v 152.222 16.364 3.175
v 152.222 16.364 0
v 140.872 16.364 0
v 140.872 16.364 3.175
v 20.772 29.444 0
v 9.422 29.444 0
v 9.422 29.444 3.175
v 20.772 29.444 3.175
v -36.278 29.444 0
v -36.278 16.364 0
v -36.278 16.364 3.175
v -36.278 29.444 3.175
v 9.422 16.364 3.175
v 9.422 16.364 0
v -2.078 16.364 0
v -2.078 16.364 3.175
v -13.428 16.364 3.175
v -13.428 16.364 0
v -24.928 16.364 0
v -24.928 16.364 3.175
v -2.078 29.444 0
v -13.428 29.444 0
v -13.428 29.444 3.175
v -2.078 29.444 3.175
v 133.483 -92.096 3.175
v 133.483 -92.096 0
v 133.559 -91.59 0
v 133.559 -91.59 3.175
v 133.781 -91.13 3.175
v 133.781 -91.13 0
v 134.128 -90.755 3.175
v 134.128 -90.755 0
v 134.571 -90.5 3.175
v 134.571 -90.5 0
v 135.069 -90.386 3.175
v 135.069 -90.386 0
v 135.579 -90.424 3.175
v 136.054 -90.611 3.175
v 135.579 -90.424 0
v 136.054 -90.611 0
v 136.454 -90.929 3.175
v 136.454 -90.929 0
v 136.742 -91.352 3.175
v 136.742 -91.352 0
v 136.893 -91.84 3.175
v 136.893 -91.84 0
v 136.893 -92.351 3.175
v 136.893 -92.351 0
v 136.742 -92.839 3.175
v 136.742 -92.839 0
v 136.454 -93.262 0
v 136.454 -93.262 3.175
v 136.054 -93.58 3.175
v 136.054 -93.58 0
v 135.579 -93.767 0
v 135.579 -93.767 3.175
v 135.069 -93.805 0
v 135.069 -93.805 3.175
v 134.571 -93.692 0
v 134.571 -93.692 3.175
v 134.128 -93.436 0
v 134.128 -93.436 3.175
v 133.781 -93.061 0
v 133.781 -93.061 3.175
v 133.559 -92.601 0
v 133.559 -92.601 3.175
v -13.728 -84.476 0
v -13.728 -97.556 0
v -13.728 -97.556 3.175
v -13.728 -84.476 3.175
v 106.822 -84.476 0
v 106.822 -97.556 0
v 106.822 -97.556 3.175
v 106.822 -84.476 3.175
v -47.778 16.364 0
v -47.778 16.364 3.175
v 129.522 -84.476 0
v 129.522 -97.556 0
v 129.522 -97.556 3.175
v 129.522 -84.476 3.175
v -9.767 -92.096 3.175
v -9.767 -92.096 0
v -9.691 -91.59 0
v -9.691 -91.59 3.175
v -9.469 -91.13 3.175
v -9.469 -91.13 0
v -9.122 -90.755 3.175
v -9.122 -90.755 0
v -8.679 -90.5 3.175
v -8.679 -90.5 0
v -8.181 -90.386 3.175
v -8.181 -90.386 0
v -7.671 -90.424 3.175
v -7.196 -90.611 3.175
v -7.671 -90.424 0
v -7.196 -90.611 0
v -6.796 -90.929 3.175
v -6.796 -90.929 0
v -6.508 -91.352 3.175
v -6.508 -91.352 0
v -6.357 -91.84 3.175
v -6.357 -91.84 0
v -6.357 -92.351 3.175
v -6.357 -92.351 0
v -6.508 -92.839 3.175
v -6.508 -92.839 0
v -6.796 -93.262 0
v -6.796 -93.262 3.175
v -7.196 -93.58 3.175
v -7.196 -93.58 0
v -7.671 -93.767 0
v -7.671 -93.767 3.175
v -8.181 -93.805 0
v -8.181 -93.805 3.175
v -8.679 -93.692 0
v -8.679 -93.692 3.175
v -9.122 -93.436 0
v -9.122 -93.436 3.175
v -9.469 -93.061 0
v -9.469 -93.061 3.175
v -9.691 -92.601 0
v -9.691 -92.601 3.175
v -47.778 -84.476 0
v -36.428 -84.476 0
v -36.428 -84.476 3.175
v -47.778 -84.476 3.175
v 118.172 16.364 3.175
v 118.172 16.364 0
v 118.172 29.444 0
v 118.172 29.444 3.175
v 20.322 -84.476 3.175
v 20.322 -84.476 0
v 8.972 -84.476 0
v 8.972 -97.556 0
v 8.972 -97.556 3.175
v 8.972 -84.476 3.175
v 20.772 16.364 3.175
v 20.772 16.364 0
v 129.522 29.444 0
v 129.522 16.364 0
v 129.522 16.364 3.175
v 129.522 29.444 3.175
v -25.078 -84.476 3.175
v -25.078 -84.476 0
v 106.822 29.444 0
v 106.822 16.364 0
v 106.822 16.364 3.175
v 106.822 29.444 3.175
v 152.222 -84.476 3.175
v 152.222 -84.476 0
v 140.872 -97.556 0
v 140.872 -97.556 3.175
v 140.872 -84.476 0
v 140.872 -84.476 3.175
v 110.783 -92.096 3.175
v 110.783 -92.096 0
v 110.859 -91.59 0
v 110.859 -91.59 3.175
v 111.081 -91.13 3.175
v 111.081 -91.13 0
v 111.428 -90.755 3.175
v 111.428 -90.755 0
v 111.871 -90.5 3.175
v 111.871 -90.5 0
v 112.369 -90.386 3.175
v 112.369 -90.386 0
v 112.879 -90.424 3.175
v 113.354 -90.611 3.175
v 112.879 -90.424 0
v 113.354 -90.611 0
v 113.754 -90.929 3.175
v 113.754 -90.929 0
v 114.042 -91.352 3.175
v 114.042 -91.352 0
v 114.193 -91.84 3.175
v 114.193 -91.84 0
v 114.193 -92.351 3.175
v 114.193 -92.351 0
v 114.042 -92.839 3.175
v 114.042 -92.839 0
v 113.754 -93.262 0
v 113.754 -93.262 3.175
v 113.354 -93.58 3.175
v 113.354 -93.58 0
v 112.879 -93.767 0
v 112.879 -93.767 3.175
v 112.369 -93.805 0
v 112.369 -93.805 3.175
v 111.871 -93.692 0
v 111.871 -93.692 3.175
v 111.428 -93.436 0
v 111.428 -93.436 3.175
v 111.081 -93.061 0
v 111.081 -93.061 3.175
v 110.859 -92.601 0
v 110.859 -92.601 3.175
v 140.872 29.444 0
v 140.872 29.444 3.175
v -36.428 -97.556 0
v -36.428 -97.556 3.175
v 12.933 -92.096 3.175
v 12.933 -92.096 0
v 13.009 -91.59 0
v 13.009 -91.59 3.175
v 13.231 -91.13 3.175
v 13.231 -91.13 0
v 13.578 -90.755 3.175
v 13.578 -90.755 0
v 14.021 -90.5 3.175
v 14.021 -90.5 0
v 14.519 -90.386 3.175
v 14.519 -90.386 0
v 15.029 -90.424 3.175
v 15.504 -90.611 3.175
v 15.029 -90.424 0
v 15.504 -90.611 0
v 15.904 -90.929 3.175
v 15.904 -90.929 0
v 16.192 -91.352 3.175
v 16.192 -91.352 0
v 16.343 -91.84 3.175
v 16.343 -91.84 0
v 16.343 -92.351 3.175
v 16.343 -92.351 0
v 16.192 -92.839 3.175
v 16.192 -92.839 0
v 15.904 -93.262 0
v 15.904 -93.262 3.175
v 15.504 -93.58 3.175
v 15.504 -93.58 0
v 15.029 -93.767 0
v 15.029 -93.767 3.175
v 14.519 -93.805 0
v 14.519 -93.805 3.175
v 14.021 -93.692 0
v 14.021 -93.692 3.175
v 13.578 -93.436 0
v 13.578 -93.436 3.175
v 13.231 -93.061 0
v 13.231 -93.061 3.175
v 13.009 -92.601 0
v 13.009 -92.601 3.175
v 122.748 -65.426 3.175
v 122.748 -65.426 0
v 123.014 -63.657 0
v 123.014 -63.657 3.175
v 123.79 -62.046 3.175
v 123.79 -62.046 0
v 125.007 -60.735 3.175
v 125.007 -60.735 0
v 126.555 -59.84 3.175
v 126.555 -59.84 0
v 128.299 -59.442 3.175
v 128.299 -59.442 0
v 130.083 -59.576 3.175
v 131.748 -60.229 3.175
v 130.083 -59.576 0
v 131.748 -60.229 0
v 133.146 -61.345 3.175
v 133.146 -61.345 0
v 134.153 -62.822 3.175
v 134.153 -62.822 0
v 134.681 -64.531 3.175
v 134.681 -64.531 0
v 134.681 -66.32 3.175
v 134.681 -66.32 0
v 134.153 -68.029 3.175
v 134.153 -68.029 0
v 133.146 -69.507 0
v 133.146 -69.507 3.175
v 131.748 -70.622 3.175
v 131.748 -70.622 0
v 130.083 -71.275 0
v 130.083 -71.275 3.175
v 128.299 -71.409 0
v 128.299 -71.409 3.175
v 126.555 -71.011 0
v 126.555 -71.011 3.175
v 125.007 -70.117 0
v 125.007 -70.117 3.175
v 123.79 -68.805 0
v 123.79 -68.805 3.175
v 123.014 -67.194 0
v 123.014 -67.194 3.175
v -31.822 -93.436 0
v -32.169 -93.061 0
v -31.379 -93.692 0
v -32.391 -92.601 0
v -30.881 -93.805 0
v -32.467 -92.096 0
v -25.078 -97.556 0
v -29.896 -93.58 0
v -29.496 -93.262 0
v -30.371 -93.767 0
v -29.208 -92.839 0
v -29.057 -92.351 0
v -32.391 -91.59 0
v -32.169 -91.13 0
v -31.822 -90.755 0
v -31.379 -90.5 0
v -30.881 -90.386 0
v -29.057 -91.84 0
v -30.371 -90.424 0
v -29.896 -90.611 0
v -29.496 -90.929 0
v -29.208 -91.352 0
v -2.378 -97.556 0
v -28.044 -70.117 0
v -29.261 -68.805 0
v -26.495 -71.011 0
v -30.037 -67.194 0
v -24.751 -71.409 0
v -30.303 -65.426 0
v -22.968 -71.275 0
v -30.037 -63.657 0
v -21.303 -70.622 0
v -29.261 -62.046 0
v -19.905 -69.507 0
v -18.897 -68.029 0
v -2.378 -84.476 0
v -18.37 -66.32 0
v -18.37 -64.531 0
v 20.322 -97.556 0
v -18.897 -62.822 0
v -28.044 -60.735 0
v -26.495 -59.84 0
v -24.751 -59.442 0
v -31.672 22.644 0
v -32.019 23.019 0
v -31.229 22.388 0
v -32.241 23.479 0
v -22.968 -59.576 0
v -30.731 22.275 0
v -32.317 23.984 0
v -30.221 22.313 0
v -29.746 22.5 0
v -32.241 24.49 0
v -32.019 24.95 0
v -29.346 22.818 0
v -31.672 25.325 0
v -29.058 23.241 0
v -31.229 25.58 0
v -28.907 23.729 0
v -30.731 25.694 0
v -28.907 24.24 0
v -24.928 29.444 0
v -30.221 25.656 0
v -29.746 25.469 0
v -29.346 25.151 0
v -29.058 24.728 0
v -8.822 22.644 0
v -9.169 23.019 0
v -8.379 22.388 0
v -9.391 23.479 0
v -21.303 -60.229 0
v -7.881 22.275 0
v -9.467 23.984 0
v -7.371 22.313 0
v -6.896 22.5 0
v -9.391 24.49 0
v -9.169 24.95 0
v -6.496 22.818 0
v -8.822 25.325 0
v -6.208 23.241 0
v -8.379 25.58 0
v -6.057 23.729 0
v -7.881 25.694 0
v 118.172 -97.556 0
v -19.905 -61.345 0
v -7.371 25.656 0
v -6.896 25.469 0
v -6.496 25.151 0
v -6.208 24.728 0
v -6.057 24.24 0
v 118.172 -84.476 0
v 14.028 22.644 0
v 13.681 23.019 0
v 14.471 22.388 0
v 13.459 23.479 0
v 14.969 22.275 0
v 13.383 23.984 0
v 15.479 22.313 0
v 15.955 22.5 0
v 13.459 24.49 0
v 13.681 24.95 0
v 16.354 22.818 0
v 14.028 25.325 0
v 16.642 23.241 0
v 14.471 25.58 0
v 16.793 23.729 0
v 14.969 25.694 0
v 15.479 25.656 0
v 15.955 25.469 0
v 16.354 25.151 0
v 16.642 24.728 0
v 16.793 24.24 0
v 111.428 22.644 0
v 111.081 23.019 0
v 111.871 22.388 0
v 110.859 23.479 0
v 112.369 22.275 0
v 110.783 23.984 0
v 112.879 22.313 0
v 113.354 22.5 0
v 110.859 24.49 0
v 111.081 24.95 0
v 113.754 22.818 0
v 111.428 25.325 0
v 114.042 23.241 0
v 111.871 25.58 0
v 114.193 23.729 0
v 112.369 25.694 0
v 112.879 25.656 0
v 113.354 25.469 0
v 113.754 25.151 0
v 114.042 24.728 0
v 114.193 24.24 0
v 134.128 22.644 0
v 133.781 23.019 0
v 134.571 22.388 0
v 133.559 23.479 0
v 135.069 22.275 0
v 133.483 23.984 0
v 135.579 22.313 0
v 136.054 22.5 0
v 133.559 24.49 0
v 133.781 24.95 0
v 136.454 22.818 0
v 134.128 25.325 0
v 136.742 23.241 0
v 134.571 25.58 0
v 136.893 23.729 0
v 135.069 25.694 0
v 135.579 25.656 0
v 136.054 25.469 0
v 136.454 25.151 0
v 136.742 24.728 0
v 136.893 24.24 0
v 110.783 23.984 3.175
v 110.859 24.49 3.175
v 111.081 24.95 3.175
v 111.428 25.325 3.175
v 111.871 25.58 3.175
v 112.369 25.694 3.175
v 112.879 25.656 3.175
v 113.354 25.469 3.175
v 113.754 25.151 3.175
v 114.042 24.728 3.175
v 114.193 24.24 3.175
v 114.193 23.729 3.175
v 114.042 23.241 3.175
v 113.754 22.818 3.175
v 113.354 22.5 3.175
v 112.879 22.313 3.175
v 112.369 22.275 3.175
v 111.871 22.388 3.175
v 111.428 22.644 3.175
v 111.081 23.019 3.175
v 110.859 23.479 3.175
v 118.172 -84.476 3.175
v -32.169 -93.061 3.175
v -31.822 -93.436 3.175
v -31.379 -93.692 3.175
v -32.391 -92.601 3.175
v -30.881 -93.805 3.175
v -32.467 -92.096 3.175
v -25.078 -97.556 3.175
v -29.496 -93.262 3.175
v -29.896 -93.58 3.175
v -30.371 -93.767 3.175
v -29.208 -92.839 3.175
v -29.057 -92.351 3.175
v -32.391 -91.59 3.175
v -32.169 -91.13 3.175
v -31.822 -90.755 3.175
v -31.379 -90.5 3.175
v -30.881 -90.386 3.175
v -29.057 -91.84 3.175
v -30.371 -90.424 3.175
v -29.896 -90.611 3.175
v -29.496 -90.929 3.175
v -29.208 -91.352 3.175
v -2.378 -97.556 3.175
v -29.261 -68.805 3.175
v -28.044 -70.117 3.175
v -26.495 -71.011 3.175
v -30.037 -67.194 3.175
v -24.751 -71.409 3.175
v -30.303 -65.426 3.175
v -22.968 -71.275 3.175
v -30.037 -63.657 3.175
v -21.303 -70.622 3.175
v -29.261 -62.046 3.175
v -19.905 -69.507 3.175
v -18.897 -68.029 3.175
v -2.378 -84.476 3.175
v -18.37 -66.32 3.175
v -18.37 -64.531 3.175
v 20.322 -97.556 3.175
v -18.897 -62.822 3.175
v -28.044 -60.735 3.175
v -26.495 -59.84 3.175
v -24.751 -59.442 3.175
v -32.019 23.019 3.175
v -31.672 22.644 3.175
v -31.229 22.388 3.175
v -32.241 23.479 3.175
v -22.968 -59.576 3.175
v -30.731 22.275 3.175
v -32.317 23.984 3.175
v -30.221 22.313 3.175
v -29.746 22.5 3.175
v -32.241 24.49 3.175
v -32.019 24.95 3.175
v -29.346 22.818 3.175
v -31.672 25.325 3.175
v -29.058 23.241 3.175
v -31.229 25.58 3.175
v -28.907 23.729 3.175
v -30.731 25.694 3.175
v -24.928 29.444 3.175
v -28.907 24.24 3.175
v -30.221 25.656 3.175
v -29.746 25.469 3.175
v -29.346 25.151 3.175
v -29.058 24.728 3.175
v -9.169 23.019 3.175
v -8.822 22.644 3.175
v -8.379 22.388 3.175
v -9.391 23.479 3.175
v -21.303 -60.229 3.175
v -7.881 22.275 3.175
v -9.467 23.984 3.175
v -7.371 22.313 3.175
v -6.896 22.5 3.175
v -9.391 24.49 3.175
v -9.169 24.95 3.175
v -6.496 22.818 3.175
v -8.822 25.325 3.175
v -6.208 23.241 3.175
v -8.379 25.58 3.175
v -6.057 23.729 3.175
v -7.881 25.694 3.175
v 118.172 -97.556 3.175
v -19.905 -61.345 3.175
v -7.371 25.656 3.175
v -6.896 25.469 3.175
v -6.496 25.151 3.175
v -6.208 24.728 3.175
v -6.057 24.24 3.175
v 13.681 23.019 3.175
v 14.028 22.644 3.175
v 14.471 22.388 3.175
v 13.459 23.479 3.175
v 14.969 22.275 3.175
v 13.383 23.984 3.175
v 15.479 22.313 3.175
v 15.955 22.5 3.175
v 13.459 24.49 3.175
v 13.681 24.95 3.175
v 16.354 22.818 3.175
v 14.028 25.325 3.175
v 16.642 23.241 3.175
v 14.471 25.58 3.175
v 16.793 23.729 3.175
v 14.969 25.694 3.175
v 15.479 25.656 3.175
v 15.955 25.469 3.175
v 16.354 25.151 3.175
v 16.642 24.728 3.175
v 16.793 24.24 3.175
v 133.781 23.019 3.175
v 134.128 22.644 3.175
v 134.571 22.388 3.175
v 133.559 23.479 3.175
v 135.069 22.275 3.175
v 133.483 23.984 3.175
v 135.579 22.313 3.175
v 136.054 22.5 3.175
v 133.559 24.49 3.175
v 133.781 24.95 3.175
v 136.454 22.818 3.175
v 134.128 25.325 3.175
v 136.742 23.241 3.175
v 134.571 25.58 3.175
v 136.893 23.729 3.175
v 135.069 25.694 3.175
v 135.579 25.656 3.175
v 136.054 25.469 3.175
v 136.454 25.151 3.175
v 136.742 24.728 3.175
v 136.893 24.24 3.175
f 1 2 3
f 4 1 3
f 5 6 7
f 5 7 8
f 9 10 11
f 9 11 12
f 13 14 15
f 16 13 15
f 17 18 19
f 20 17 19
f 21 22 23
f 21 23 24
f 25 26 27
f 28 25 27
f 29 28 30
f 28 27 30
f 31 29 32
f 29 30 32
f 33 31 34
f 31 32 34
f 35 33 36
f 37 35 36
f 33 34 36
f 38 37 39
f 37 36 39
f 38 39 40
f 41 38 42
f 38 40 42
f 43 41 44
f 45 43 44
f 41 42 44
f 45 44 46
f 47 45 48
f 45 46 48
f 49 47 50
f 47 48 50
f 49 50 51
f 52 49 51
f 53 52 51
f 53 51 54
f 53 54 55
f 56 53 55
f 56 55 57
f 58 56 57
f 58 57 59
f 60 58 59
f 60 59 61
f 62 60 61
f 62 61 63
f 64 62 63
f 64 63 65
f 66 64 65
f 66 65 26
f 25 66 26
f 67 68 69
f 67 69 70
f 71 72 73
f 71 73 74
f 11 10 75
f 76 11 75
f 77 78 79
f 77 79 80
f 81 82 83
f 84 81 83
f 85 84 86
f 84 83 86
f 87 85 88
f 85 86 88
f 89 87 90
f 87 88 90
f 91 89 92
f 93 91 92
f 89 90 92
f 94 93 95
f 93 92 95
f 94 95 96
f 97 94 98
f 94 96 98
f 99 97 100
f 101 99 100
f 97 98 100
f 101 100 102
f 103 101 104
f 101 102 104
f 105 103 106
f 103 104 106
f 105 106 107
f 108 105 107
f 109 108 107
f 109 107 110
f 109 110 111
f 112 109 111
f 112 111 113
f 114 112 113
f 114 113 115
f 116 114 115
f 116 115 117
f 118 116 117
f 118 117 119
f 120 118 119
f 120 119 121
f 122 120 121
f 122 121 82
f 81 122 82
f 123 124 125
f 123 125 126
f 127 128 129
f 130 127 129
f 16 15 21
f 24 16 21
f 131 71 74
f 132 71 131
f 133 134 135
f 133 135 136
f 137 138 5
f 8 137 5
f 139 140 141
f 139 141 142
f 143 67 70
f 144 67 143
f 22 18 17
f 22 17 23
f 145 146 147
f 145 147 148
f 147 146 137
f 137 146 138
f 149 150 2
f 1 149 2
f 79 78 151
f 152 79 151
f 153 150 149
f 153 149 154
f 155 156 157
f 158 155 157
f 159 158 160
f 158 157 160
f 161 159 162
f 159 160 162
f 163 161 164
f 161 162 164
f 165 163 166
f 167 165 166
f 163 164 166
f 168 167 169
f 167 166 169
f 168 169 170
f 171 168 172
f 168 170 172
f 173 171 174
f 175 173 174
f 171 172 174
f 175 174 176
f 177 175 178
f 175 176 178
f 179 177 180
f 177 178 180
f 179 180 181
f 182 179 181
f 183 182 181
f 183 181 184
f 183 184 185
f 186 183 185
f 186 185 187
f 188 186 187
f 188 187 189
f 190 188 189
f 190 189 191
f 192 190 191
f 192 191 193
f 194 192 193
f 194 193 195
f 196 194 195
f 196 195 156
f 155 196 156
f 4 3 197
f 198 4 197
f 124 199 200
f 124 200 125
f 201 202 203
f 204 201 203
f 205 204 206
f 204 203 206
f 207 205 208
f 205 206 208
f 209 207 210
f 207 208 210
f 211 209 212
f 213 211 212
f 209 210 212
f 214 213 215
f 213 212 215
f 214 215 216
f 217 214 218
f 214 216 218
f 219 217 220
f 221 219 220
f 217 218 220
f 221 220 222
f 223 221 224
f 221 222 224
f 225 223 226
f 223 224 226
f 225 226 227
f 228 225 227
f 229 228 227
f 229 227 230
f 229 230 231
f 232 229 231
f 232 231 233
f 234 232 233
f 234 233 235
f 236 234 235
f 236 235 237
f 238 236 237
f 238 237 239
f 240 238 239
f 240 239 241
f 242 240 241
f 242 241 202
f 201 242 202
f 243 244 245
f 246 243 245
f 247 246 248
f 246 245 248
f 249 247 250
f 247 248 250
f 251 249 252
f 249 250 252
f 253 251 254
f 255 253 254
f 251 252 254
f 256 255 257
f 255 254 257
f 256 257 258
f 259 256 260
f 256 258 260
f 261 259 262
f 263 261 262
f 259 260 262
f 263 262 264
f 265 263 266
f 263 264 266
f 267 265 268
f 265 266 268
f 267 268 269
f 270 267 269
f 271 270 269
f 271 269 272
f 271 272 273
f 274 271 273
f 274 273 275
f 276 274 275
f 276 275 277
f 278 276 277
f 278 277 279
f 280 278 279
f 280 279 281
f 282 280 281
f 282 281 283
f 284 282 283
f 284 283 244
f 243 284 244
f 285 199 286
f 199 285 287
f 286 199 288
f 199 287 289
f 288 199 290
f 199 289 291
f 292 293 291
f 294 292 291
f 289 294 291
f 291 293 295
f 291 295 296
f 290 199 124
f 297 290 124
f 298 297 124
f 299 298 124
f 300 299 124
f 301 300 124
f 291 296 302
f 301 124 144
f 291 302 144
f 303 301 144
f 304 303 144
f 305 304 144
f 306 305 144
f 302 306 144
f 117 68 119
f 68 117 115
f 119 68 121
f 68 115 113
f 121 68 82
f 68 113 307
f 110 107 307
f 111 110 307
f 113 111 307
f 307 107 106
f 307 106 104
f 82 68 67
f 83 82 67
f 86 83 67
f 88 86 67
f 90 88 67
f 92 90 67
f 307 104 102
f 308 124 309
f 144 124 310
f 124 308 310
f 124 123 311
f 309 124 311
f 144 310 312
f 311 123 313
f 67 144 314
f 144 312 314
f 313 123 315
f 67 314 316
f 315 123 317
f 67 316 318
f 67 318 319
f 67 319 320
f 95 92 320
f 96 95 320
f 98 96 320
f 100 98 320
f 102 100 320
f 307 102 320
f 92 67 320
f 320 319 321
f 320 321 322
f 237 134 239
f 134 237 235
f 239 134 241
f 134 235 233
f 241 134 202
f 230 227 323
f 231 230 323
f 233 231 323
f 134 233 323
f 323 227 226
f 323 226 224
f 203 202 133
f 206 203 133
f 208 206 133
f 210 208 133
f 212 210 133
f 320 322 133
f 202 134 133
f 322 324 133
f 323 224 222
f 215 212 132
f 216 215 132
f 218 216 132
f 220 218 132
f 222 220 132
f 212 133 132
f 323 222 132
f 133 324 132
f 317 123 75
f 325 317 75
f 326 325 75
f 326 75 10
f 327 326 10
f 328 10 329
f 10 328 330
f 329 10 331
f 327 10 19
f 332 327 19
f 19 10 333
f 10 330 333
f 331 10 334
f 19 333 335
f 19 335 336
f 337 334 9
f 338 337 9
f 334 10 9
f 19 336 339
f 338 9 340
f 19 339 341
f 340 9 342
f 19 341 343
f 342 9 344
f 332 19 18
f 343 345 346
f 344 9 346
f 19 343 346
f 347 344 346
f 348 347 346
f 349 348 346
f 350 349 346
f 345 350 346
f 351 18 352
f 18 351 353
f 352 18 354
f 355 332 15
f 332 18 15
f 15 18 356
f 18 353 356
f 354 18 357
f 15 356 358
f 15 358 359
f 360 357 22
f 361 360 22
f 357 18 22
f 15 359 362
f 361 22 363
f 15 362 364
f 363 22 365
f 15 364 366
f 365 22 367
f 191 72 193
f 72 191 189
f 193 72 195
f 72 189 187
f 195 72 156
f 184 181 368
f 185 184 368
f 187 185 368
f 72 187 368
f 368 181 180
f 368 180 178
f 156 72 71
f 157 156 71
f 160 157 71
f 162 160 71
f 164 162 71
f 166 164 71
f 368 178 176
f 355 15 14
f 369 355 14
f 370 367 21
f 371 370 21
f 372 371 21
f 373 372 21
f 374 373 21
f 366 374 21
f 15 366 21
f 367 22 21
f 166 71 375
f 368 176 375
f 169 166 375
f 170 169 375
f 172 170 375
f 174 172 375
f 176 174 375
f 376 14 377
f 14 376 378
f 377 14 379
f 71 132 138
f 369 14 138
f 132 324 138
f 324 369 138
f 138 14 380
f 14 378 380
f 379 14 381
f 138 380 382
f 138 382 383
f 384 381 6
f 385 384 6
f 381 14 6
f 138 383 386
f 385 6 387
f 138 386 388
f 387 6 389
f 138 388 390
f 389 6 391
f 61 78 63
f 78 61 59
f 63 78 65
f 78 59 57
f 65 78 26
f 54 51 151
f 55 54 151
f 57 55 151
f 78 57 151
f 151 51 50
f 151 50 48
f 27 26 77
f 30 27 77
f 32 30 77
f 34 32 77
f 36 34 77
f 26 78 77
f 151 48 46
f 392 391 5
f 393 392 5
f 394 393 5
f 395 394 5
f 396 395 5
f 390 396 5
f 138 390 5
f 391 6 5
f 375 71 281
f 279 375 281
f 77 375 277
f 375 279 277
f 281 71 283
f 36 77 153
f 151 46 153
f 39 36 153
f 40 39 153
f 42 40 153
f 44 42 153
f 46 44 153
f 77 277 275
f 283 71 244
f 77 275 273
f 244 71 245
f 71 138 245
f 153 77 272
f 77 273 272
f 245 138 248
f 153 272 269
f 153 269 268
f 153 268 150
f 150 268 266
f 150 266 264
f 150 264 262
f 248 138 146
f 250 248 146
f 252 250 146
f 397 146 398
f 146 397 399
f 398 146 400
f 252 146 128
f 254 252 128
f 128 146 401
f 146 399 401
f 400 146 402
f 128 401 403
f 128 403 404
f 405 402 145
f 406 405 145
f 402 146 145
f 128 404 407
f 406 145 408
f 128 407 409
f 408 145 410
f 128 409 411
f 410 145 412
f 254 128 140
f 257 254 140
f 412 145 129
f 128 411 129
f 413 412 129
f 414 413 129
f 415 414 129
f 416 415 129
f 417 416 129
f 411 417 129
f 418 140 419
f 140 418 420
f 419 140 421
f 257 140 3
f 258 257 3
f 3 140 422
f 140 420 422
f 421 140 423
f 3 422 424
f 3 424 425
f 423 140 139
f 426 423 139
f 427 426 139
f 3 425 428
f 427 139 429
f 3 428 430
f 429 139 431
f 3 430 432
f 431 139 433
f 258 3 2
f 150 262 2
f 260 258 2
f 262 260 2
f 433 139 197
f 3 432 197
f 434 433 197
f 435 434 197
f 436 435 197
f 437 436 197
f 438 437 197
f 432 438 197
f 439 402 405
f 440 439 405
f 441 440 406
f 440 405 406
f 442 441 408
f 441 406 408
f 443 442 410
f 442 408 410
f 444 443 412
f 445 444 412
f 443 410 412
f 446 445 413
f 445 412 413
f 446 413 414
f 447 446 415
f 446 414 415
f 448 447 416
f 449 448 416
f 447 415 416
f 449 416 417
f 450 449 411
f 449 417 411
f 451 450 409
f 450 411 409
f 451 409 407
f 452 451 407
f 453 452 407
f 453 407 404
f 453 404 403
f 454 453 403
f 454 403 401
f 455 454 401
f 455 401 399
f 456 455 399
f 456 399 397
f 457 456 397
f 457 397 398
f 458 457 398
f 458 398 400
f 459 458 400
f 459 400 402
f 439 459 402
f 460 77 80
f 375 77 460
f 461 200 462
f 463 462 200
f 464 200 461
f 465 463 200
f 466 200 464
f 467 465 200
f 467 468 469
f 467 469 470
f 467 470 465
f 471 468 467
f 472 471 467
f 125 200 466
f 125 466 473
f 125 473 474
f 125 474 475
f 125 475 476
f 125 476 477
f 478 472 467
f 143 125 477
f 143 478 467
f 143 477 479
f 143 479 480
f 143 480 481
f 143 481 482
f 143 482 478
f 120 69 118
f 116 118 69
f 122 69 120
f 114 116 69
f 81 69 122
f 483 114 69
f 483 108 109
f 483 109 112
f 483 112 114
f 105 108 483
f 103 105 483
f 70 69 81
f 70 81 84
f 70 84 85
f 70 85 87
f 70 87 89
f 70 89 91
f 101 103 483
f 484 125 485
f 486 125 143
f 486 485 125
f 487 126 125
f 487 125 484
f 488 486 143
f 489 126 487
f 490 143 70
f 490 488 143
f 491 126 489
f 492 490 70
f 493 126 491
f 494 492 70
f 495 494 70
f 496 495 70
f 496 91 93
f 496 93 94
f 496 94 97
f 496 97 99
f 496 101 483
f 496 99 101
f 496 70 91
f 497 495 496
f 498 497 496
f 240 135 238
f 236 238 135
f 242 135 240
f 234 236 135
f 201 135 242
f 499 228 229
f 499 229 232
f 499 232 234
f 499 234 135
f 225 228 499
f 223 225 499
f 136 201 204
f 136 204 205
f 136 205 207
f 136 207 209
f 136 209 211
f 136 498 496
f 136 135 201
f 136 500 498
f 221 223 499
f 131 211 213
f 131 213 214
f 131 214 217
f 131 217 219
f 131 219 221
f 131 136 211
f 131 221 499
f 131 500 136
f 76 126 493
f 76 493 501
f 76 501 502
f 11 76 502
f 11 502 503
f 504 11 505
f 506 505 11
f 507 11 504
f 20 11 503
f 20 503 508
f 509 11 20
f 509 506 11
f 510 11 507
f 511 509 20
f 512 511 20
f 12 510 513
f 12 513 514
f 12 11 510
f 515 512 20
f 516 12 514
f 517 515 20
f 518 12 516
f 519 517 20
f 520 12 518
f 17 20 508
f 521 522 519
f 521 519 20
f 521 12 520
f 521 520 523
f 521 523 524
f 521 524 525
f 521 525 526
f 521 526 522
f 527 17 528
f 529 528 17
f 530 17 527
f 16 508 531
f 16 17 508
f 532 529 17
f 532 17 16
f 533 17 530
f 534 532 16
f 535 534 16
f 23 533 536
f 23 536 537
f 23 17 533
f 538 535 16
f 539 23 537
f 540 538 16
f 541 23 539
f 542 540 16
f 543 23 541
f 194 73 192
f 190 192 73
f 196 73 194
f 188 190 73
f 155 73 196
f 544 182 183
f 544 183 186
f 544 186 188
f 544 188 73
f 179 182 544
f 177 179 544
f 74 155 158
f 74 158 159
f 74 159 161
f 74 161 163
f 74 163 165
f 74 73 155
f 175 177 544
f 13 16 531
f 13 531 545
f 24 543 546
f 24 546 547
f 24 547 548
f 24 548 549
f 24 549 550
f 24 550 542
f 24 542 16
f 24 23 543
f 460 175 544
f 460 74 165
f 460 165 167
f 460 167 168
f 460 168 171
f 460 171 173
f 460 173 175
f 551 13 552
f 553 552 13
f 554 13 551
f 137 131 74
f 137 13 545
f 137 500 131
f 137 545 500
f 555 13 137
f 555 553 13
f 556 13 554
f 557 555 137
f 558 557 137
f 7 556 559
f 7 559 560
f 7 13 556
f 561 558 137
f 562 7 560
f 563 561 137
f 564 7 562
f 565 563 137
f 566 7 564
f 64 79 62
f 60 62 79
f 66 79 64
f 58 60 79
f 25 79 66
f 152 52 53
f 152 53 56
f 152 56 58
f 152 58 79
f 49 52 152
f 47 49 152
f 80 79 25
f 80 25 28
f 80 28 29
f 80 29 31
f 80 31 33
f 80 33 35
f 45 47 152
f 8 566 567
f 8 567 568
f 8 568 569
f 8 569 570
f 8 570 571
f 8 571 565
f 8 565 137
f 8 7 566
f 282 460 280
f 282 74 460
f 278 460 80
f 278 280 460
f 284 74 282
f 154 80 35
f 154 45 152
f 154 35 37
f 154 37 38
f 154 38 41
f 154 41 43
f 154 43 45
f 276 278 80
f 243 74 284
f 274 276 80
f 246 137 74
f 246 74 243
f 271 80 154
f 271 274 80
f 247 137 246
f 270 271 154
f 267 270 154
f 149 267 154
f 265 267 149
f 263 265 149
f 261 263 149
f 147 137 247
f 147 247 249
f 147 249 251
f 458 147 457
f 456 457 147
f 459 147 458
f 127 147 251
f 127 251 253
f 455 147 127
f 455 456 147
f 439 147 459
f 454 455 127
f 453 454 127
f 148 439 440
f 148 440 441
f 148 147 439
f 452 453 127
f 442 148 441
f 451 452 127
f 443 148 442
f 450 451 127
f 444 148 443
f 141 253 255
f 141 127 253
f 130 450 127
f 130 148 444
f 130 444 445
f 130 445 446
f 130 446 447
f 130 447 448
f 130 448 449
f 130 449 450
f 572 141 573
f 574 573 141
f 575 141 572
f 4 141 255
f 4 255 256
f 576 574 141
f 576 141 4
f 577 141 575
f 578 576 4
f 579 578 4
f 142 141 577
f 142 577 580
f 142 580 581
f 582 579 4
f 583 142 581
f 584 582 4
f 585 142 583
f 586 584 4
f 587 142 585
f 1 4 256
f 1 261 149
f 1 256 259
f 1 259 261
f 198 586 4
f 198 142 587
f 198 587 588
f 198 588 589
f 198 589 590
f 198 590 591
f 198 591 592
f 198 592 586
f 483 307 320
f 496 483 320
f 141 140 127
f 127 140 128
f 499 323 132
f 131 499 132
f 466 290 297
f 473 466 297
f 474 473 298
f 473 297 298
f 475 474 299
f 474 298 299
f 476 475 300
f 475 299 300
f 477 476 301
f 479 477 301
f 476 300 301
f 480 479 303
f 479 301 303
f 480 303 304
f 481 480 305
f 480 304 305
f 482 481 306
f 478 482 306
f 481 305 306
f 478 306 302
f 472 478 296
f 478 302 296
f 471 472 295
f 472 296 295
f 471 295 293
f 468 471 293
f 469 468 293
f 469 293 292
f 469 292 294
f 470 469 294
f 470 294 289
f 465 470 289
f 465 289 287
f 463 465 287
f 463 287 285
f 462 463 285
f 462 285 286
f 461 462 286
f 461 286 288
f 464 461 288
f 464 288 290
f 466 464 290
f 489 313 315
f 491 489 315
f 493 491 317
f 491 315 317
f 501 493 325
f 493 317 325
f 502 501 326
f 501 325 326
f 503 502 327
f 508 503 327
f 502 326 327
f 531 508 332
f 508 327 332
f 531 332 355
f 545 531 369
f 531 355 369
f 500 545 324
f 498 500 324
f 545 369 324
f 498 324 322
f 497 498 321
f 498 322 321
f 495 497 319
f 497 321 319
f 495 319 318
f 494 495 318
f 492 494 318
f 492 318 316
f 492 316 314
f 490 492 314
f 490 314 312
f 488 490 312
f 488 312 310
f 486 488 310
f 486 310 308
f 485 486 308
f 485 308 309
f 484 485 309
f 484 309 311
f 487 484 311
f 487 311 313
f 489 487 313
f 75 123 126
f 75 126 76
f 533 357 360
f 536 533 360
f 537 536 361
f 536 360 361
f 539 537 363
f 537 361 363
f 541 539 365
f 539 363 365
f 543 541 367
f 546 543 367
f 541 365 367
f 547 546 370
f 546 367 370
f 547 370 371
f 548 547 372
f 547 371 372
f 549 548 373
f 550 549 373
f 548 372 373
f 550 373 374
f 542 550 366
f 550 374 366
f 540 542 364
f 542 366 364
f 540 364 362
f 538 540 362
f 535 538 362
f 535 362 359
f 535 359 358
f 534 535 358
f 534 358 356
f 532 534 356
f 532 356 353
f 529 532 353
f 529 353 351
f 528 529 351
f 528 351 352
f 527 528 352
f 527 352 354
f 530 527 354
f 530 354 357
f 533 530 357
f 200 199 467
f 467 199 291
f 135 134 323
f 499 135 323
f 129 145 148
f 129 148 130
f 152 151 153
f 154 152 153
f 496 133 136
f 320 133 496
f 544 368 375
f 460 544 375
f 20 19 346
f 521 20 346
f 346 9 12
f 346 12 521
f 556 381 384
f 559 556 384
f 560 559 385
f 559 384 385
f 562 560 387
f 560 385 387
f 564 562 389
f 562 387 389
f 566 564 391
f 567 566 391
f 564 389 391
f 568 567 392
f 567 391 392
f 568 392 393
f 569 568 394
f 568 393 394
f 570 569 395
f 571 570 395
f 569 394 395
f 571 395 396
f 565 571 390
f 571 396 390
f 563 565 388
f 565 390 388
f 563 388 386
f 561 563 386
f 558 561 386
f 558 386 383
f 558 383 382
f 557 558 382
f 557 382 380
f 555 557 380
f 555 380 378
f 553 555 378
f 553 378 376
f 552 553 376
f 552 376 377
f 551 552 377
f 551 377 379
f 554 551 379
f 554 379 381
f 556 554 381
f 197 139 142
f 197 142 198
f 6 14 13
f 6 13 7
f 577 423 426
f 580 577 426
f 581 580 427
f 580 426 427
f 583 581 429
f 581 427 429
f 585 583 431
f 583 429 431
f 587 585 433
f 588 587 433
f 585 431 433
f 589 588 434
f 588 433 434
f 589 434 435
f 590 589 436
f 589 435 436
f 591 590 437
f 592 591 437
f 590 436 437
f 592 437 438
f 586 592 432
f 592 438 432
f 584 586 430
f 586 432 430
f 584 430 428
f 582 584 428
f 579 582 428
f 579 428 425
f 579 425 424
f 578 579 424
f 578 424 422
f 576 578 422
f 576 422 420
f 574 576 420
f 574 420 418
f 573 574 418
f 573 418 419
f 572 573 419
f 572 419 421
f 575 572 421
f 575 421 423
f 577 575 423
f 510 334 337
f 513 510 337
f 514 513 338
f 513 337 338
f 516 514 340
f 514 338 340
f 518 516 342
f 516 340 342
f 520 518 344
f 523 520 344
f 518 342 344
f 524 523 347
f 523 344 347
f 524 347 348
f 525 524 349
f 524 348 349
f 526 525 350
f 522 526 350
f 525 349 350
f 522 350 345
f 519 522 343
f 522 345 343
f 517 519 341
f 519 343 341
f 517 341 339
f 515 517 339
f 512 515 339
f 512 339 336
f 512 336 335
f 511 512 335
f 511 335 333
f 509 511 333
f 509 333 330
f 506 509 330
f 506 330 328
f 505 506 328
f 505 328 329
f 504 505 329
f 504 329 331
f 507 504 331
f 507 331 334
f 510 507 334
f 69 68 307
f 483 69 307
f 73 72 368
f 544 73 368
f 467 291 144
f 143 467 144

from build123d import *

# Parameters (mm, degrees)
SKETCH1_W               = 200
SKETCH1_H               = 127
BOSS_EXTRUDE1_DEPTH     = 3.175
SKETCH4_W               = 11.35
SKETCH4_H               = 13.0800094
SKETCH4_W_2             = 86.049970282
SKETCH4_W_3             = 11.50001
SKETCH4_W_4             = 86.500000282
CUT_EXTRUDE1_DEPTH      = 4.175
SKETCH5_R               = 6
CUT_EXTRUDE2_DEPTH      = 1
CUT_EXTRUDE2_DEPTH_BACK = 4.175
SKETCH6_R               = 1.7145
CUT_EXTRUDE3_DEPTH      = 4.175


with BuildPart() as part:
    # Sketch1 → Boss-Extrude1 (new body)
    with BuildSketch(Plane.XY):
        with Locations((52.222222222, -34.055555556)):
            Rectangle(SKETCH1_W, SKETCH1_H)
    extrude(amount=BOSS_EXTRUDE1_DEPTH)

    # Sketch4 → Cut-Extrude1 (cut, through all)
    with BuildSketch(Plane(origin=(0, 0, 0), x_dir=(-1, 0, 0), z_dir=(0, 0, -1))):
        with Locations((-146.547222222, 22.904439744)):
            Rectangle(SKETCH4_W, SKETCH4_H)
        with Locations((-123.847222222, 22.904439744)):
            Rectangle(SKETCH4_W, SKETCH4_H)
        with Locations((-63.797237175, 22.904439744)):
            Rectangle(SKETCH4_W_2, SKETCH4_H)
        with Locations((-3.672247128, 22.904439744)):
            Rectangle(SKETCH4_W_3, SKETCH4_H)
        with Locations((19.177762872, 22.904439744)):
            Rectangle(SKETCH4_W_3, SKETCH4_H)
        with Locations((42.027772778, 22.904439744)):
            Rectangle(SKETCH4_W_3, SKETCH4_H)
        with Locations((-146.547222222, -91.015550856)):
            Rectangle(SKETCH4_W, SKETCH4_H)
        with Locations((-123.847222222, -91.015550856)):
            Rectangle(SKETCH4_W, SKETCH4_H)
        with Locations((-63.572222175, -91.015550856)):
            Rectangle(SKETCH4_W_4, SKETCH4_H)
        with Locations((-3.297222034, -91.015550856)):
            Rectangle(SKETCH4_W, SKETCH4_H)
        with Locations((19.402777872, -91.015550856)):
            Rectangle(SKETCH4_W, SKETCH4_H)
        with Locations((42.102777778, -91.015550856)):
            Rectangle(SKETCH4_W, SKETCH4_H)
    extrude(amount=-CUT_EXTRUDE1_DEPTH, mode=Mode.SUBTRACT)

    # Sketch5 → Cut-Extrude2 (cut, two sides)
    with BuildSketch(Plane(origin=(0, 0, 0), x_dir=(-1, 0, 0), z_dir=(0, 0, -1))) as cut_extrude2_sk:
        with Locations((-128.747542222, -65.425546156)):
            Circle(SKETCH5_R)
        with Locations((24.303097778, -65.425546156)):
            Circle(SKETCH5_R)
    extrude(amount=CUT_EXTRUDE2_DEPTH, mode=Mode.SUBTRACT)
    extrude(cut_extrude2_sk.sketch, amount=-CUT_EXTRUDE2_DEPTH_BACK, mode=Mode.SUBTRACT)

    # Sketch6 → Cut-Extrude3 (cut, through all)
    with BuildSketch(Plane(origin=(0, 0, 0), x_dir=(-1, 0, 0), z_dir=(0, 0, -1))):
        with Locations((-135.197222222, 23.984435044)):
            Circle(SKETCH6_R)
        with Locations((-112.497222269, 23.984435044)):
            Circle(SKETCH6_R)
        with Locations((-15.097252081, 23.984435044)):
            Circle(SKETCH6_R)
        with Locations((7.752757872, 23.984435044)):
            Circle(SKETCH6_R)
        with Locations((30.602767825, 23.984435044)):
            Circle(SKETCH6_R)
        with Locations((-112.497222269, -92.095546156)):
            Circle(SKETCH6_R)
        with Locations((-135.197222222, -92.095546156)):
            Circle(SKETCH6_R)
        with Locations((-14.647222034, -92.095546156)):
            Circle(SKETCH6_R)
        with Locations((8.052777919, -92.095546156)):
            Circle(SKETCH6_R)
        with Locations((30.752777825, -92.095546156)):
            Circle(SKETCH6_R)
    extrude(amount=-CUT_EXTRUDE3_DEPTH, mode=Mode.SUBTRACT)


solid = part.part
